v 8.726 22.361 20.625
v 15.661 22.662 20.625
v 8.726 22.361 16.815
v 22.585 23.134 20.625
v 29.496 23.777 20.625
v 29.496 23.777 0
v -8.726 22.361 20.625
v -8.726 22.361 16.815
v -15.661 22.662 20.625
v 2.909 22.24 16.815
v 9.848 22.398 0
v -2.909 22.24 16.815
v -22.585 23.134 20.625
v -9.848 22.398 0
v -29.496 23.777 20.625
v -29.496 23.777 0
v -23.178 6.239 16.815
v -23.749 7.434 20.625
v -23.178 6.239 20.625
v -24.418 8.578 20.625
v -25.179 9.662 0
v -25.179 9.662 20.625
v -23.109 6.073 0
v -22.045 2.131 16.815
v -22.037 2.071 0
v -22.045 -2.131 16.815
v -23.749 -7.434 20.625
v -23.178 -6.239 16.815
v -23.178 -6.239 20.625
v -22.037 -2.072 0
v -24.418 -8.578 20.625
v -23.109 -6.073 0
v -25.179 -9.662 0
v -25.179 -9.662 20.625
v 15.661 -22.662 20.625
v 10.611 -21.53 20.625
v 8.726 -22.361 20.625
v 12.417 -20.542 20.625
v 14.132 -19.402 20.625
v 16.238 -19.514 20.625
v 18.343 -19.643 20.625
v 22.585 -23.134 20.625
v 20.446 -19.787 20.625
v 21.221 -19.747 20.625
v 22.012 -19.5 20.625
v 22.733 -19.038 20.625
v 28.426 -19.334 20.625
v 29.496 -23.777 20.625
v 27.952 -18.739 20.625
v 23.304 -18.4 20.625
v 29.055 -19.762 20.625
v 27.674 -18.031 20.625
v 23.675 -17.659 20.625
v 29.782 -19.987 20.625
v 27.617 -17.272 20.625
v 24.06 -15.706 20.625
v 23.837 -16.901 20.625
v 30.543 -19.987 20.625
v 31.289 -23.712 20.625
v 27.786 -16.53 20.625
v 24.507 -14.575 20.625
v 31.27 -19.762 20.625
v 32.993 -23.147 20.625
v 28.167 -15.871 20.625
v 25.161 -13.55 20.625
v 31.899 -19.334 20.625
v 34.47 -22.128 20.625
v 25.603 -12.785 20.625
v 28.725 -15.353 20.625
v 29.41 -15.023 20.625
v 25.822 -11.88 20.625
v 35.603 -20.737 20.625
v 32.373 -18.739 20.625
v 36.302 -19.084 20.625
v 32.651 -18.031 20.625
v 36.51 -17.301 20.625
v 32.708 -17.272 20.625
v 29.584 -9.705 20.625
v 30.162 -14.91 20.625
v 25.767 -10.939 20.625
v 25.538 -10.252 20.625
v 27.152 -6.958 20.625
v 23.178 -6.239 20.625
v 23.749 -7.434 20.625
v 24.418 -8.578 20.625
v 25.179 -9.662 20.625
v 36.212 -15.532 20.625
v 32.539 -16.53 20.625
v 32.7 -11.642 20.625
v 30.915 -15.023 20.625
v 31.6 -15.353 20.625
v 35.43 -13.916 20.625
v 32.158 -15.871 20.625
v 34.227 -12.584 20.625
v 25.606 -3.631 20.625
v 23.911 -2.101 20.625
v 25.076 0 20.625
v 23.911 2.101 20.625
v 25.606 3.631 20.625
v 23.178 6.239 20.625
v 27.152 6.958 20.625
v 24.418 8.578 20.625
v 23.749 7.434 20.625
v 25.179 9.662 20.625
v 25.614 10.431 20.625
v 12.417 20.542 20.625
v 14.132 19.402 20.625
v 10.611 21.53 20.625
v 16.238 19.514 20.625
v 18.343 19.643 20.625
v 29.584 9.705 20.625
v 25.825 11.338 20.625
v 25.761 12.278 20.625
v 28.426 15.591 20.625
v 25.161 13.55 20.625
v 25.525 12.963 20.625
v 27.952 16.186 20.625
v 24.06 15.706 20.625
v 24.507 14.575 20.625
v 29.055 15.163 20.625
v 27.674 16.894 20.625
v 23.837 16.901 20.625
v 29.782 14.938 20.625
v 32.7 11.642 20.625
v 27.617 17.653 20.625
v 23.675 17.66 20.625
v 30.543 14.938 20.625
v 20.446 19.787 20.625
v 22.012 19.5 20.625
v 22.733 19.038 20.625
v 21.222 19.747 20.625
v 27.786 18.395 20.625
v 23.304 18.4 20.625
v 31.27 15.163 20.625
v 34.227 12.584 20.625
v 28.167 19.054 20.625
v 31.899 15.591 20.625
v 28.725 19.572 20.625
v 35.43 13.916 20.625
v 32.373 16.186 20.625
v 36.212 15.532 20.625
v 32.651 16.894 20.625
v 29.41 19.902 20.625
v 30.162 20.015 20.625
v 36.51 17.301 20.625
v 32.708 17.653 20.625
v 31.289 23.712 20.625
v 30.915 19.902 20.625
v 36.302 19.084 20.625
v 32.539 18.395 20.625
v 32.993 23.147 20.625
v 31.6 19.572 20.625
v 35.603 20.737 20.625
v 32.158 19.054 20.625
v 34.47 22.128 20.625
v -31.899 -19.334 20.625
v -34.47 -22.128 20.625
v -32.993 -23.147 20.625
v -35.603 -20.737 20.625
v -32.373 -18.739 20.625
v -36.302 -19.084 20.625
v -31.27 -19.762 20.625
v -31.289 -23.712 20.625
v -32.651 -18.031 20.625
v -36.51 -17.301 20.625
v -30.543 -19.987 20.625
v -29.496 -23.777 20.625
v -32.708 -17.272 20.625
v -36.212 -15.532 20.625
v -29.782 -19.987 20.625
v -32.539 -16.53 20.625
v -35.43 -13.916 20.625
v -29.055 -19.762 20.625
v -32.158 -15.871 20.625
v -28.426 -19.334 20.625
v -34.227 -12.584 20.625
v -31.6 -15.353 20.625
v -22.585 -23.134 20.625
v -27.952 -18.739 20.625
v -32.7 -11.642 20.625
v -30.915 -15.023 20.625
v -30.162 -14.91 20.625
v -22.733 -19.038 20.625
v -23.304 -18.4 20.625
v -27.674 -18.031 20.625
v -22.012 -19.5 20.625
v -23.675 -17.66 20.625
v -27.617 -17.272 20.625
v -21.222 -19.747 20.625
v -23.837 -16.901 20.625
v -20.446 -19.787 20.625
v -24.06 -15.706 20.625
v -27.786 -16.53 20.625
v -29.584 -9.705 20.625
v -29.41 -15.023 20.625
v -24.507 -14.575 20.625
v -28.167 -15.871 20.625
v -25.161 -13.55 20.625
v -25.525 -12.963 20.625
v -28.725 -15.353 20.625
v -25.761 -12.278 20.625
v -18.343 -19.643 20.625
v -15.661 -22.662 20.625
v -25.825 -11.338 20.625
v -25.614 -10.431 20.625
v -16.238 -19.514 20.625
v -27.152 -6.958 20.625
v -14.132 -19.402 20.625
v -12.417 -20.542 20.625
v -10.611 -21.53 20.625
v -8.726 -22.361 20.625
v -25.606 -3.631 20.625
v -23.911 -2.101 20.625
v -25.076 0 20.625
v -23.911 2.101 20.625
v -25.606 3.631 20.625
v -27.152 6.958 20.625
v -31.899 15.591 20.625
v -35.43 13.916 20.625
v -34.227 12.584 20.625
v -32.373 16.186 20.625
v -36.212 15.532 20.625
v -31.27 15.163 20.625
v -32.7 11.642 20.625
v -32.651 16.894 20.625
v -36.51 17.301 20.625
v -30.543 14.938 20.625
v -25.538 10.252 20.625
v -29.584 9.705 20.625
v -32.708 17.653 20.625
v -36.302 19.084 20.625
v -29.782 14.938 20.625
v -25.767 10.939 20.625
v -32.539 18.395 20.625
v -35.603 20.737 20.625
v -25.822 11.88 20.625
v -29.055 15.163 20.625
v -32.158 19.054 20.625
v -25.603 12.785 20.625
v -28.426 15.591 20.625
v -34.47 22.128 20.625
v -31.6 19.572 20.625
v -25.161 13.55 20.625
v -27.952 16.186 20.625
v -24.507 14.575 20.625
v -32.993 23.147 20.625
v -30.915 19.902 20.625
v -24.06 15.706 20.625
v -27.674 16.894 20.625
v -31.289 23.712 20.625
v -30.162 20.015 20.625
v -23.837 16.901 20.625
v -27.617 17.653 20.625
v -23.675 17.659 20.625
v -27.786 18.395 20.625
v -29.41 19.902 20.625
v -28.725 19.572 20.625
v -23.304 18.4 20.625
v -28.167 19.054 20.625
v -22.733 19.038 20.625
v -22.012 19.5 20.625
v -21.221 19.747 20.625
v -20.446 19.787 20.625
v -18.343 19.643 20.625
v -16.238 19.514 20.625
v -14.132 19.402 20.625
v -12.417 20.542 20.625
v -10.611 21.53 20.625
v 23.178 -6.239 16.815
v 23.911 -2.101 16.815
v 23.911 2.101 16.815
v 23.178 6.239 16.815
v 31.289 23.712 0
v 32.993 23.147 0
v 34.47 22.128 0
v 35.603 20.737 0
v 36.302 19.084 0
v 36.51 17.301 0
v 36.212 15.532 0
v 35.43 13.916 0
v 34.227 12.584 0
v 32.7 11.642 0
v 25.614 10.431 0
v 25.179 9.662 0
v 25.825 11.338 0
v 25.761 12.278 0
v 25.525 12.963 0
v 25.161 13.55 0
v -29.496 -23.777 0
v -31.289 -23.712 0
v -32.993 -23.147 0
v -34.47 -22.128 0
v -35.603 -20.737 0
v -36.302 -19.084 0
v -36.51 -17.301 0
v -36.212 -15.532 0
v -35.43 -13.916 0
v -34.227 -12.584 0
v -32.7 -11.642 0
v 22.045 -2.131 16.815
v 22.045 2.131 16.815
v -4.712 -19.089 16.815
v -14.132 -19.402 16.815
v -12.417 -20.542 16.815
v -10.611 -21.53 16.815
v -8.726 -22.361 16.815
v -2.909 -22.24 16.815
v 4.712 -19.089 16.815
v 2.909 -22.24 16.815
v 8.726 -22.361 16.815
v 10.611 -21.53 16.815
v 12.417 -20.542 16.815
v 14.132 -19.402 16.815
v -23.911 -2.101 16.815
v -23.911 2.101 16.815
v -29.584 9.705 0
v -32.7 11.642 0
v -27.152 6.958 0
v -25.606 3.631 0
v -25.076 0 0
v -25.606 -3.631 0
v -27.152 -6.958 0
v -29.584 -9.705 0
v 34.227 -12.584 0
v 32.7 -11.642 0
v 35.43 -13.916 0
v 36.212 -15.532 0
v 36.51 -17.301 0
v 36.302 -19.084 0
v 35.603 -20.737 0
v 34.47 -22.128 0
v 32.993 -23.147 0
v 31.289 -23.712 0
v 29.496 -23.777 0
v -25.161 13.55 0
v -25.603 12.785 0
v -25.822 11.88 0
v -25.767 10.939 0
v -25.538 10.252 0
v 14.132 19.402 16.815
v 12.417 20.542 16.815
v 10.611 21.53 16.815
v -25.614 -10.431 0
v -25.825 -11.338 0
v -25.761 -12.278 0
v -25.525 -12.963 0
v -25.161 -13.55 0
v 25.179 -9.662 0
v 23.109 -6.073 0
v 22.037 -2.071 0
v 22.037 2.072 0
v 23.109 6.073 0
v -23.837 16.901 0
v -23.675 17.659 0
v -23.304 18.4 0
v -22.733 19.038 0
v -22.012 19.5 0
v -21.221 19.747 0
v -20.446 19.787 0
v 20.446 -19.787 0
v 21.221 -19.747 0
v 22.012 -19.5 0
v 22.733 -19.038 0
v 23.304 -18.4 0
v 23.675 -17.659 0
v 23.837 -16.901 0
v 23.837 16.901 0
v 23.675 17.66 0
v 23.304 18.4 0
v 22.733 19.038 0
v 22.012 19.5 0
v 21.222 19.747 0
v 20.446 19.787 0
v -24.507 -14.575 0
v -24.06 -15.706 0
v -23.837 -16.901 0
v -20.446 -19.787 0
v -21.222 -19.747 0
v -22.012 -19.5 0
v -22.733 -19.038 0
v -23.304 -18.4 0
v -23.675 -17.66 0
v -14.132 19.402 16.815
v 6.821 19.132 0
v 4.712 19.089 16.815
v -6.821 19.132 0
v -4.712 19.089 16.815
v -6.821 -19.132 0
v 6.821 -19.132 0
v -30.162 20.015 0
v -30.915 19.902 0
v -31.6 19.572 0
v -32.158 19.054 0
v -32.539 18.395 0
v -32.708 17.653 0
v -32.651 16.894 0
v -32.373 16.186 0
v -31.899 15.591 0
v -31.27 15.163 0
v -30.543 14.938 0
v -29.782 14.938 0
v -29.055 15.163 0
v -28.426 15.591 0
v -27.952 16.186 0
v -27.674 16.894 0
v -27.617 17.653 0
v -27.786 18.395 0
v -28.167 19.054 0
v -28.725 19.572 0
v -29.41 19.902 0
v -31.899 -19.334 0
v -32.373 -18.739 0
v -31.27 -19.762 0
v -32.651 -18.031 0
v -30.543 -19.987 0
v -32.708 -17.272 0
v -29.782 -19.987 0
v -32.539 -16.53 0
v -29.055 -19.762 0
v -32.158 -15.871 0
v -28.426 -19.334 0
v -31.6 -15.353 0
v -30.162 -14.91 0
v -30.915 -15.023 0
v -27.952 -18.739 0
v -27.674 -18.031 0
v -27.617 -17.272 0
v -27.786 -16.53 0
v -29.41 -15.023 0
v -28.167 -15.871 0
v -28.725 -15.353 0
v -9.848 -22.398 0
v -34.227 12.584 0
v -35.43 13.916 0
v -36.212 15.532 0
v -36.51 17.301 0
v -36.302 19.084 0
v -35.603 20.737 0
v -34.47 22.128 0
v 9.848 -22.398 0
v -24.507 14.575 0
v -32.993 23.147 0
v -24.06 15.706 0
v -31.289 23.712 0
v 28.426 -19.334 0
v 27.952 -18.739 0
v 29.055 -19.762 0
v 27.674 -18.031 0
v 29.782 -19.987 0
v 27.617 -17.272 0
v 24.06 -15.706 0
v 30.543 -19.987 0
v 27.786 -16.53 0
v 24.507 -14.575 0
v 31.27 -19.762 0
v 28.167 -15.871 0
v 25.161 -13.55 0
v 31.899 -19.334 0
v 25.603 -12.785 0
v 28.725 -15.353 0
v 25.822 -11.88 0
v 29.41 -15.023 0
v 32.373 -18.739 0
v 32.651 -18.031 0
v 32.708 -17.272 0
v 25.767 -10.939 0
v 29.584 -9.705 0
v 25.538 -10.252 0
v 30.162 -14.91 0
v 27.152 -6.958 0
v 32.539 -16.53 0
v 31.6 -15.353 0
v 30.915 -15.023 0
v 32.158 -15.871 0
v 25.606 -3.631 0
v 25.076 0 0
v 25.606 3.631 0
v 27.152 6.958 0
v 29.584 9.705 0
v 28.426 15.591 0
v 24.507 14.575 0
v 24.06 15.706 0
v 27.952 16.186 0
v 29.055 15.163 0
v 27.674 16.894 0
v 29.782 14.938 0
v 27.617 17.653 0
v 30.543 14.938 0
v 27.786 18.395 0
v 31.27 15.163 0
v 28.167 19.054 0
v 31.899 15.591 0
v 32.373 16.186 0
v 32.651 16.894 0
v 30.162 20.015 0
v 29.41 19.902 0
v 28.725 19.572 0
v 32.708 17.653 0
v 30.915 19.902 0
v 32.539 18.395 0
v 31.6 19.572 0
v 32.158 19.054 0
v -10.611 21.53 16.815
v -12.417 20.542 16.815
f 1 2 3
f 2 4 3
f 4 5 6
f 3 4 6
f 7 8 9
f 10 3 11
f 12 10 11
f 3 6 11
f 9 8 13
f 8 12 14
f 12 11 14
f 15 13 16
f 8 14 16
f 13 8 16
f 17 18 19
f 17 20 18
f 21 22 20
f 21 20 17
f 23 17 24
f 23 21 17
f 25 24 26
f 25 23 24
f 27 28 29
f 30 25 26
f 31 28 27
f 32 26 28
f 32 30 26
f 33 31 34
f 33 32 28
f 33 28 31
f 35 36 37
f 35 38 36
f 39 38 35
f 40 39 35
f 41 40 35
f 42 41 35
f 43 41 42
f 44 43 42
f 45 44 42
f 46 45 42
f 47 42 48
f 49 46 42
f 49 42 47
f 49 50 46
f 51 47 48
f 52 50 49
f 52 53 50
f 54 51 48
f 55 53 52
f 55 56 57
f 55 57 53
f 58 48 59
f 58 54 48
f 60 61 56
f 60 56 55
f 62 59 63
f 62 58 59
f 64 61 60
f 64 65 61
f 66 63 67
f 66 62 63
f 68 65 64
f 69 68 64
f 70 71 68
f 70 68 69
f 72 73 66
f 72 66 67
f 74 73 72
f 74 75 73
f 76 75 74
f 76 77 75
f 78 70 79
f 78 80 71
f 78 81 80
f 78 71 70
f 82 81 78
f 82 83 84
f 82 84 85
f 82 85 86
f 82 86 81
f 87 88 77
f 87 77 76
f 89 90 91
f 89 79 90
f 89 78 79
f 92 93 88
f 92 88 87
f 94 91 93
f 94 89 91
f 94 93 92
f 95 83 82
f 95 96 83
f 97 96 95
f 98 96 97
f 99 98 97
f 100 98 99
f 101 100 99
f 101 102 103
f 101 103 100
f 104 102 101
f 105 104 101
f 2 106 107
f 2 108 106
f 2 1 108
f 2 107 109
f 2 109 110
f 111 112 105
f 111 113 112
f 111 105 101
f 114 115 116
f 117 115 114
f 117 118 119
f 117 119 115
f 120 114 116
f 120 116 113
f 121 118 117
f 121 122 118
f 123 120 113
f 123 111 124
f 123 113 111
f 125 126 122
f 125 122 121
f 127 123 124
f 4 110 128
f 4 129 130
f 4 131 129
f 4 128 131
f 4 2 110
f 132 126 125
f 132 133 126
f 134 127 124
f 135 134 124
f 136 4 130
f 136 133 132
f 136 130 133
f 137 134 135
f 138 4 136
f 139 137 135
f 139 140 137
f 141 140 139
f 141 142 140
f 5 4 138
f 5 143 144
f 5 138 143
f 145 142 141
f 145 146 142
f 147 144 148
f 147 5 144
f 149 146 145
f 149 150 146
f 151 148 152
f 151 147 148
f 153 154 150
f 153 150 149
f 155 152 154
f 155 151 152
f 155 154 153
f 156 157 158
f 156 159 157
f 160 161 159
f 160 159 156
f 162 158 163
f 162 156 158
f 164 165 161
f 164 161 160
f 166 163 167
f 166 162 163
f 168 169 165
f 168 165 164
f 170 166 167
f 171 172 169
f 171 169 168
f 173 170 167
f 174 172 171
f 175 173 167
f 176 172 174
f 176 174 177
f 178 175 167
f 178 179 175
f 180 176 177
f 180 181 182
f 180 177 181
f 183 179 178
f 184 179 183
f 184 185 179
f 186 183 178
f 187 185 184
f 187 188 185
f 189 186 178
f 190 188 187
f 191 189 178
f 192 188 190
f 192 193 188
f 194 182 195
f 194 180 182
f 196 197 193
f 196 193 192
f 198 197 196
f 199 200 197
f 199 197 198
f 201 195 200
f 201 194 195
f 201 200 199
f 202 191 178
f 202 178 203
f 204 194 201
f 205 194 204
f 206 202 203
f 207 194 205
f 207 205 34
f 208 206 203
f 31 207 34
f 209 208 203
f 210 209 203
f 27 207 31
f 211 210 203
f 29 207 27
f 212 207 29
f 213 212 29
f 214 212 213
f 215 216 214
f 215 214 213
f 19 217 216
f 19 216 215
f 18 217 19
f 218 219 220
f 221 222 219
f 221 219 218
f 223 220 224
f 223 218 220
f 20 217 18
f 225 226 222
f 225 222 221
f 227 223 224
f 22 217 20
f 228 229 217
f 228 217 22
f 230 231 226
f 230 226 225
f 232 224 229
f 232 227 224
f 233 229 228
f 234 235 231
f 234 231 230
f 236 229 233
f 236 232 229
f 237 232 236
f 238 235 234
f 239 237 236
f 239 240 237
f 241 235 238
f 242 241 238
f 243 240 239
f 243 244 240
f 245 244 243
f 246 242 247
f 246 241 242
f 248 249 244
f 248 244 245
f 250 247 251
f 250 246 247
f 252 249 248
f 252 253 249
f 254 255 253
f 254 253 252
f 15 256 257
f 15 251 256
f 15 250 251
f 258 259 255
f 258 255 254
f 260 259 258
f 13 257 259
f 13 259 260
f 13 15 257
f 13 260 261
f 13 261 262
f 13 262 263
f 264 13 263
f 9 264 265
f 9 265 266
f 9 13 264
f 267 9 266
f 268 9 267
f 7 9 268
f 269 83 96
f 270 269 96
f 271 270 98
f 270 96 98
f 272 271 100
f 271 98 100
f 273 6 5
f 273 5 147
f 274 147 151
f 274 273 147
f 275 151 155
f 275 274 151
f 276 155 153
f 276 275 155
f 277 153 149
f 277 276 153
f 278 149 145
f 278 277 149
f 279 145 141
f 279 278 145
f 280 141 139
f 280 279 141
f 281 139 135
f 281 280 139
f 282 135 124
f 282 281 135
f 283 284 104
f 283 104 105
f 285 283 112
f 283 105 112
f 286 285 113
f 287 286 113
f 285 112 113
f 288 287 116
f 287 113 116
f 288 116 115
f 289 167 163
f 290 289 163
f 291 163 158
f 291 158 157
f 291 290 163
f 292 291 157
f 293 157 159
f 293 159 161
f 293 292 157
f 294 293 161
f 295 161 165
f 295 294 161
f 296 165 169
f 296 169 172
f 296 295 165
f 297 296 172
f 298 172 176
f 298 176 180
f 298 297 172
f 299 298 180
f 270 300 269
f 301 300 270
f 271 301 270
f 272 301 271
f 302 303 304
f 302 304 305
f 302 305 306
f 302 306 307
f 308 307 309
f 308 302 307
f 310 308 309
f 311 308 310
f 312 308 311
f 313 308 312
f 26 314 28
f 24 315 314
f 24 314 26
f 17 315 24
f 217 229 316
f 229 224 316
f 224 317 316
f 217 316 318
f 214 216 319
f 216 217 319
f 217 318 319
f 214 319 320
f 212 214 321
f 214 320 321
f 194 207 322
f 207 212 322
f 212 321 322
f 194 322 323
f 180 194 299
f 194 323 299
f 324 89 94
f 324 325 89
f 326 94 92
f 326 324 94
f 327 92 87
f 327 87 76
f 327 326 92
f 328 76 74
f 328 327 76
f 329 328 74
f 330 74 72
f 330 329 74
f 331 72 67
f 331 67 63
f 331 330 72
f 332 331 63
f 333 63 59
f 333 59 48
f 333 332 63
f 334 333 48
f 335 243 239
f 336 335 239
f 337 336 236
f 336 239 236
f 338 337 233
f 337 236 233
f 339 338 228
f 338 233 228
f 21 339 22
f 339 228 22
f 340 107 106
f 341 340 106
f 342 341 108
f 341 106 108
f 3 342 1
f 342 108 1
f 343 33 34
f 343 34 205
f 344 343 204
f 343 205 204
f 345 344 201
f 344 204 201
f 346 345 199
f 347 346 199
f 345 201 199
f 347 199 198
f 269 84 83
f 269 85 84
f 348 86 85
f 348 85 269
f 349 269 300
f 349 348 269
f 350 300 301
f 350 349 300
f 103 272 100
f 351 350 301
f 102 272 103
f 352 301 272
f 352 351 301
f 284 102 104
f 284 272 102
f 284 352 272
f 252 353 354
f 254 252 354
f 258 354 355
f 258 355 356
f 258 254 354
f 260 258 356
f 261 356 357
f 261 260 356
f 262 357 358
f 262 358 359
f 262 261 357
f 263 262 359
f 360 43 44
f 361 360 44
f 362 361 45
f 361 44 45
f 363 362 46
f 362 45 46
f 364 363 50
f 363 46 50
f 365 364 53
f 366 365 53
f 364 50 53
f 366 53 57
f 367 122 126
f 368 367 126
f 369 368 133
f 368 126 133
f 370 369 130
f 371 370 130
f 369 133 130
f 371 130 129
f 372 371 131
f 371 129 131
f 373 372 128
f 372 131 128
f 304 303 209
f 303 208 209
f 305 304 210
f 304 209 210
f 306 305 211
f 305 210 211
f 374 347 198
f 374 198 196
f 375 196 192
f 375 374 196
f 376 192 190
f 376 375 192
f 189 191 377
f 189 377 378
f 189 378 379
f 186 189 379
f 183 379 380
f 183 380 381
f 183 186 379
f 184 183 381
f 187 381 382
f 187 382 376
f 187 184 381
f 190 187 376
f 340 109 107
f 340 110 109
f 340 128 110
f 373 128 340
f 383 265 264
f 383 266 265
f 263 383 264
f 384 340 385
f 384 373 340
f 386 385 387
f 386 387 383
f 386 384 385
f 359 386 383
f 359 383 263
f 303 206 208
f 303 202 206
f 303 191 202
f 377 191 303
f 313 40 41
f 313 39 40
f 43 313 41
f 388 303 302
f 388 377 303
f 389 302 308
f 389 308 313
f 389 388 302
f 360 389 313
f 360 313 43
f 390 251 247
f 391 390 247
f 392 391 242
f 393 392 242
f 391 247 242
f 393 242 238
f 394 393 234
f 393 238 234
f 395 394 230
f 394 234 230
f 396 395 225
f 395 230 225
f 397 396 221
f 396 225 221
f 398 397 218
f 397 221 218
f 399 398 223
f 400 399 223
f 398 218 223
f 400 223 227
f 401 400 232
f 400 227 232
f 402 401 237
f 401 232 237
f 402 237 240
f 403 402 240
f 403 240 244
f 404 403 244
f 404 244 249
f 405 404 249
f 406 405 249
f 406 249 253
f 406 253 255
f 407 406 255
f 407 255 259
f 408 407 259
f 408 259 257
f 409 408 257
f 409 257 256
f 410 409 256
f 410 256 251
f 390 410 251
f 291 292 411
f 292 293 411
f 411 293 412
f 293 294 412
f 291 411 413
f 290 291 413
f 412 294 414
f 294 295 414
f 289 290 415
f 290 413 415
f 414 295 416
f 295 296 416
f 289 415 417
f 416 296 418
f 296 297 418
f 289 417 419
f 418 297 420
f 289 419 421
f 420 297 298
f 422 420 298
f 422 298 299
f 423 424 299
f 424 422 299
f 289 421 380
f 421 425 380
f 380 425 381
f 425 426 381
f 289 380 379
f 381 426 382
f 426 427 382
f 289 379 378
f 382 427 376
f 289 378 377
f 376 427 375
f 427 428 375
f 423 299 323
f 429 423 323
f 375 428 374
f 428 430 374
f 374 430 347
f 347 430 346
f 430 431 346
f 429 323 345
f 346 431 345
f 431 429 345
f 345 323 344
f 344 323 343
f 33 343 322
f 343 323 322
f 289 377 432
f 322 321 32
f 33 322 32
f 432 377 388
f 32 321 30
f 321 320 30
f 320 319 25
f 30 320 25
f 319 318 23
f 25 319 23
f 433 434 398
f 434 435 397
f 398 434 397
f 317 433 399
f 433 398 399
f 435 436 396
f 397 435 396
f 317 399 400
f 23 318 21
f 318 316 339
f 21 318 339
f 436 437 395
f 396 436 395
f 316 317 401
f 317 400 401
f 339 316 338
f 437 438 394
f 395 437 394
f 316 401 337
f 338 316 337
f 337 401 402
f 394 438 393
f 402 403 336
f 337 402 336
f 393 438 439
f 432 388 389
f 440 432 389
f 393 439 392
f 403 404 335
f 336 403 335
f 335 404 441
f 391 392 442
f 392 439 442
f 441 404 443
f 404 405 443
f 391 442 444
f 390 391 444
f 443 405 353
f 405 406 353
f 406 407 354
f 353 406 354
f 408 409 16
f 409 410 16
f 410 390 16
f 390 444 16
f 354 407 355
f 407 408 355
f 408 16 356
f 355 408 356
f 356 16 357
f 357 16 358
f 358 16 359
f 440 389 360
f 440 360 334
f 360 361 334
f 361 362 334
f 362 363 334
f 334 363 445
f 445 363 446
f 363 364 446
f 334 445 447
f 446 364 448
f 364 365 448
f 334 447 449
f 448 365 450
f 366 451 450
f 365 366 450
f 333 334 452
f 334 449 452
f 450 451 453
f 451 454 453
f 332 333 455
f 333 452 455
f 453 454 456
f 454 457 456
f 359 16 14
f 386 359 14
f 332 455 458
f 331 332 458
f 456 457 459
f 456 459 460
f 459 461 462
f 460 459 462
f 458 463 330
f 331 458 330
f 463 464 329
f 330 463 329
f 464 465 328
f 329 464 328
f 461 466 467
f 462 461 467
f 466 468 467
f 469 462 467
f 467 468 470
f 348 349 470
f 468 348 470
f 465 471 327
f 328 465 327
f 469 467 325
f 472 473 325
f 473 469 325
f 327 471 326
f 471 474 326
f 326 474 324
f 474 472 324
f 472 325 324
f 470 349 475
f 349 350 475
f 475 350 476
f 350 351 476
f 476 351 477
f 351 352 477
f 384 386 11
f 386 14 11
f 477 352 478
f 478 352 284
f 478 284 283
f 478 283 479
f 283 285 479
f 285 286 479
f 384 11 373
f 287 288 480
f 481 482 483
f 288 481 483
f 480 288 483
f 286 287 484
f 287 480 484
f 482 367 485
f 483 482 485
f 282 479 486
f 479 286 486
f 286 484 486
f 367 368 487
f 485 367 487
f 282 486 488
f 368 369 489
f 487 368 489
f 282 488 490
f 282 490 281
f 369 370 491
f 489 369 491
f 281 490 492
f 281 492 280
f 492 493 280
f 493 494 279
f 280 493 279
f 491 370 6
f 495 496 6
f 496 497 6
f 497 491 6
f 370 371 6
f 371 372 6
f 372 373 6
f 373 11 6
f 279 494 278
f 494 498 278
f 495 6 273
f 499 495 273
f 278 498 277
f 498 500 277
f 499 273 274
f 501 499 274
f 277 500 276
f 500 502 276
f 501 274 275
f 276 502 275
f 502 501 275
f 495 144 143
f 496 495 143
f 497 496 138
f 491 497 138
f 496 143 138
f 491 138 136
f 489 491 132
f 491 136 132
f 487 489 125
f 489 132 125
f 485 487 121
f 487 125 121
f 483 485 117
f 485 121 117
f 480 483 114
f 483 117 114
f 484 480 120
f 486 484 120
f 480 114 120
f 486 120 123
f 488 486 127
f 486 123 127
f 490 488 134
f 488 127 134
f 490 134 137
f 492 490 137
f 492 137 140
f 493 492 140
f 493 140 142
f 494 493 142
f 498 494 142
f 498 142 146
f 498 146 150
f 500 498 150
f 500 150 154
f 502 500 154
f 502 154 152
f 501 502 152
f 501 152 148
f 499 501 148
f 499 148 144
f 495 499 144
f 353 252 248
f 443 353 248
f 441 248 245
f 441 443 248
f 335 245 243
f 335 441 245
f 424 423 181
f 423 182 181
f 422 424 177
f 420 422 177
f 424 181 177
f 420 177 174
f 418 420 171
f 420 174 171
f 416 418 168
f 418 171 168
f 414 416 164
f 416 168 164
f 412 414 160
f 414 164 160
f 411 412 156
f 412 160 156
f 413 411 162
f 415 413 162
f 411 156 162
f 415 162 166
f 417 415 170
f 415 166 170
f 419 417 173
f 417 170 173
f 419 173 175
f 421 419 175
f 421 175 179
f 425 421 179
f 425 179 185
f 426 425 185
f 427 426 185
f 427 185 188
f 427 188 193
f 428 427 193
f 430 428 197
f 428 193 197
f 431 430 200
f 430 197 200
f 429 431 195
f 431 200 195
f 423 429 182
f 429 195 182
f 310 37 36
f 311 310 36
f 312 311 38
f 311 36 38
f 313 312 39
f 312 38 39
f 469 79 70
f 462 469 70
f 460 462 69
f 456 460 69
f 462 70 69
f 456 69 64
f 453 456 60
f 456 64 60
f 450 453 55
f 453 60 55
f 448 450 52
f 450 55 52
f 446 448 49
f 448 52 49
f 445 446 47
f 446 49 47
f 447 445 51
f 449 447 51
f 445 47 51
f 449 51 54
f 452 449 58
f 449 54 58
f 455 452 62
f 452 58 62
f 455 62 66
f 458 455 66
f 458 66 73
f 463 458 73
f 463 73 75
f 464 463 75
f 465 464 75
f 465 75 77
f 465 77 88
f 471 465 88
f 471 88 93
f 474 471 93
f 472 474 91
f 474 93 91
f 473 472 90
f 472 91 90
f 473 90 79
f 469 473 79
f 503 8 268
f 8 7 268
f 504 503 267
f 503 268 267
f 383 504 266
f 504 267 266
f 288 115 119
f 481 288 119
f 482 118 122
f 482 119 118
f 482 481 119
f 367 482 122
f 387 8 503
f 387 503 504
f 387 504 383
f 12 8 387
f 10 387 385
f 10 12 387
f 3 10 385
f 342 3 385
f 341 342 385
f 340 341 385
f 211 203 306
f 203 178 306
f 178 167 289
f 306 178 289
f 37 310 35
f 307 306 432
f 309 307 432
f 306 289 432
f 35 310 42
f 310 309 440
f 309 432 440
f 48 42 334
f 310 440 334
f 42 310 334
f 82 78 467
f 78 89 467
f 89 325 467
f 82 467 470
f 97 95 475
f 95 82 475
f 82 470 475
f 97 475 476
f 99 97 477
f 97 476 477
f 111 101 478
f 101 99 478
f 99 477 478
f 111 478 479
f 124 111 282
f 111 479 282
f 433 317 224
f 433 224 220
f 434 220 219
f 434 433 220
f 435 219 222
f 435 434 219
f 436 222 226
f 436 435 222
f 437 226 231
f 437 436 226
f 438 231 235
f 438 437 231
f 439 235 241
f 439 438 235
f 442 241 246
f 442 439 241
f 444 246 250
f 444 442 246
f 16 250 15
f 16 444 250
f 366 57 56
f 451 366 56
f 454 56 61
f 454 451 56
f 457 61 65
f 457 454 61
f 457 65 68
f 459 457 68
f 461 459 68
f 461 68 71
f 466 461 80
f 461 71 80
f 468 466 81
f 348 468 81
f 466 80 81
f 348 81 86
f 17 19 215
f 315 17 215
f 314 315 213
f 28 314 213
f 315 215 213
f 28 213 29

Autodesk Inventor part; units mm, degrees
ref_plane "YZ Plane" through (0, 0, 0) normal (1, 0, 0) x (0, 1, 0)
ref_plane "XZ Plane" through (0, 0, 0) normal (0, 1, 0) x (-1, 0, 0)
ref_plane "XY Plane" through (0, 0, 0) normal (0, 0, 1) x (1, 0, 0)
sketch "Sketch1" plane through (0, 0, 0) normal (0, 0, 1) x (1, 0, 0)
  line L0 (-30.1625, -17.4625) -> (30.1625, -17.4625) construction
  line L1 (30.1625, -17.4625) -> (30.1625, 17.4625) construction
  line L2 (30.1625, 17.4625) -> (-30.1625, 17.4625) construction
  line L3 (-30.1625, 17.4625) -> (-30.1625, -17.4625) construction
  line L4 (-30.1625, -17.4625) -> (30.1625, 17.4625) construction
  line L5 (30.1625, -17.4625) -> (-30.1625, 17.4625) construction
  circle A0 centre (-30.1625, -17.4625) radius 6.35 construction
  circle A1 centre (-30.1625, 17.4625) radius 6.35 construction
  circle A2 centre (30.1625, 17.4625) radius 6.35 construction
  circle A3 centre (30.1625, -17.4625) radius 6.35 construction
  circle A4 centre (0, 0) radius 22.225 construction
  arc A5 (29.4959, -23.7774) -> (-29.4959, -23.7774) centre (0, -303.2125) ccw
  arc A6 (32.7003, 11.6417) -> (32.7003, -11.6417) centre (37.7759, 0) ccw
  arc A7 (-29.4959, 23.7774) -> (29.4959, 23.7774) centre (0, 303.2125) ccw
  arc A8 (-32.7003, -11.6417) -> (-32.7003, 11.6417) centre (-37.7759, 0) ccw
  arc A9 (-31.4314, -14.5521) -> (-31.4314, 14.5521) centre (-37.7759, 0) ccw
  arc A10 (184.3591, -86.9718) -> (-184.3591, -86.9718) centre (0, -303.2125) ccw
  arc A11 (31.4314, 14.5521) -> (31.4314, -14.5521) centre (37.7759, 0) ccw
  arc A12 (-184.3591, 86.9718) -> (184.3591, 86.9718) centre (0, 303.2125) ccw
  arc A13 (-29.4959, 23.7774) -> (-32.7003, 11.6417) centre (-30.1625, 17.4625) ccw
  arc A14 (-27.2047, 11.8434) -> (-24.3854, 20.0982) centre (-30.1625, 17.4625) ccw
  arc A15 (32.7003, 11.6417) -> (29.4959, 23.7774) centre (30.1625, 17.4625) ccw
  arc A16 (24.3854, 20.0982) -> (27.2047, 11.8434) centre (30.1625, 17.4625) ccw
  arc A17 (29.4959, -23.7774) -> (32.7003, -11.6417) centre (30.1625, -17.4625) ccw
  arc A18 (27.2047, -11.8434) -> (24.3854, -20.0982) centre (30.1625, -17.4625) ccw
  arc A19 (-32.7003, -11.6417) -> (-29.4959, -23.7774) centre (-30.1625, -17.4625) ccw
  arc A20 (-24.3854, -20.0982) -> (-27.2047, -11.8434) centre (-30.1625, -17.4625) ccw
  dimension "d0" = 60.325
  dimension "d1" = 34.925
  dimension "d2" = 12.7
  dimension "d3" = 12.7
  dimension "d4" = 12.7
  dimension "d5" = 12.7
  dimension "d6" = 44.45
  dimension "d7" = 12.7
  dimension "d8" = 12.7
  dimension "d9" = 3.175
  dimension "d10" = 3.175
extrude "Extrusion1" add sketch "Sketch1" along normal blind 20.6248 contours A5 A19 A10 A17 | A10 A18 A11 A16 A12 A15 A6 A17 | A19 A8 A13 A12 A14 A9 A20 A10 | A12 A13 A7 A15
fillet "Fillet1" radius 3.175 8 edges at (-27.2047, -11.8434, 10.3124) (-27.2047, 11.8434, 10.3124) (-24.3854, 20.0982, 10.3124) (24.3854, 20.0982, 10.3124) (27.2047, 11.8434, 10.3124) (27.2047, -11.8434, 10.3124) (24.3854, -20.0982, 10.3124) (-24.3854, -20.0982, 10.3124)
hole "Hole1" at (30.1625, 17.4625, 0) at (30.1625, -17.4625, 0) at (-30.1625, -17.4625, 0) at (-30.1625, 17.4625, 0) direction (0, 0, 1) diameter 5.1054 end through all clearance for "Flat Head Machine Screw (82)" size "#10" standard "Ansi Unified Screw Threads"
sketch "Sketch3" plane through (0, 0, 20.6248) normal (0, 0, 1) x (1, 0, 0)
  circle A0 centre (0, 0) radius 24.003
  dimension "d21" = 48.006
extrude "Extrusion2" cut sketch "Sketch3" against normal blind 3.81
equation "\"d8\" = d7"
equation "\"d10\" = d9"
properties part number "AR-011" material "Aluminum 6061"
